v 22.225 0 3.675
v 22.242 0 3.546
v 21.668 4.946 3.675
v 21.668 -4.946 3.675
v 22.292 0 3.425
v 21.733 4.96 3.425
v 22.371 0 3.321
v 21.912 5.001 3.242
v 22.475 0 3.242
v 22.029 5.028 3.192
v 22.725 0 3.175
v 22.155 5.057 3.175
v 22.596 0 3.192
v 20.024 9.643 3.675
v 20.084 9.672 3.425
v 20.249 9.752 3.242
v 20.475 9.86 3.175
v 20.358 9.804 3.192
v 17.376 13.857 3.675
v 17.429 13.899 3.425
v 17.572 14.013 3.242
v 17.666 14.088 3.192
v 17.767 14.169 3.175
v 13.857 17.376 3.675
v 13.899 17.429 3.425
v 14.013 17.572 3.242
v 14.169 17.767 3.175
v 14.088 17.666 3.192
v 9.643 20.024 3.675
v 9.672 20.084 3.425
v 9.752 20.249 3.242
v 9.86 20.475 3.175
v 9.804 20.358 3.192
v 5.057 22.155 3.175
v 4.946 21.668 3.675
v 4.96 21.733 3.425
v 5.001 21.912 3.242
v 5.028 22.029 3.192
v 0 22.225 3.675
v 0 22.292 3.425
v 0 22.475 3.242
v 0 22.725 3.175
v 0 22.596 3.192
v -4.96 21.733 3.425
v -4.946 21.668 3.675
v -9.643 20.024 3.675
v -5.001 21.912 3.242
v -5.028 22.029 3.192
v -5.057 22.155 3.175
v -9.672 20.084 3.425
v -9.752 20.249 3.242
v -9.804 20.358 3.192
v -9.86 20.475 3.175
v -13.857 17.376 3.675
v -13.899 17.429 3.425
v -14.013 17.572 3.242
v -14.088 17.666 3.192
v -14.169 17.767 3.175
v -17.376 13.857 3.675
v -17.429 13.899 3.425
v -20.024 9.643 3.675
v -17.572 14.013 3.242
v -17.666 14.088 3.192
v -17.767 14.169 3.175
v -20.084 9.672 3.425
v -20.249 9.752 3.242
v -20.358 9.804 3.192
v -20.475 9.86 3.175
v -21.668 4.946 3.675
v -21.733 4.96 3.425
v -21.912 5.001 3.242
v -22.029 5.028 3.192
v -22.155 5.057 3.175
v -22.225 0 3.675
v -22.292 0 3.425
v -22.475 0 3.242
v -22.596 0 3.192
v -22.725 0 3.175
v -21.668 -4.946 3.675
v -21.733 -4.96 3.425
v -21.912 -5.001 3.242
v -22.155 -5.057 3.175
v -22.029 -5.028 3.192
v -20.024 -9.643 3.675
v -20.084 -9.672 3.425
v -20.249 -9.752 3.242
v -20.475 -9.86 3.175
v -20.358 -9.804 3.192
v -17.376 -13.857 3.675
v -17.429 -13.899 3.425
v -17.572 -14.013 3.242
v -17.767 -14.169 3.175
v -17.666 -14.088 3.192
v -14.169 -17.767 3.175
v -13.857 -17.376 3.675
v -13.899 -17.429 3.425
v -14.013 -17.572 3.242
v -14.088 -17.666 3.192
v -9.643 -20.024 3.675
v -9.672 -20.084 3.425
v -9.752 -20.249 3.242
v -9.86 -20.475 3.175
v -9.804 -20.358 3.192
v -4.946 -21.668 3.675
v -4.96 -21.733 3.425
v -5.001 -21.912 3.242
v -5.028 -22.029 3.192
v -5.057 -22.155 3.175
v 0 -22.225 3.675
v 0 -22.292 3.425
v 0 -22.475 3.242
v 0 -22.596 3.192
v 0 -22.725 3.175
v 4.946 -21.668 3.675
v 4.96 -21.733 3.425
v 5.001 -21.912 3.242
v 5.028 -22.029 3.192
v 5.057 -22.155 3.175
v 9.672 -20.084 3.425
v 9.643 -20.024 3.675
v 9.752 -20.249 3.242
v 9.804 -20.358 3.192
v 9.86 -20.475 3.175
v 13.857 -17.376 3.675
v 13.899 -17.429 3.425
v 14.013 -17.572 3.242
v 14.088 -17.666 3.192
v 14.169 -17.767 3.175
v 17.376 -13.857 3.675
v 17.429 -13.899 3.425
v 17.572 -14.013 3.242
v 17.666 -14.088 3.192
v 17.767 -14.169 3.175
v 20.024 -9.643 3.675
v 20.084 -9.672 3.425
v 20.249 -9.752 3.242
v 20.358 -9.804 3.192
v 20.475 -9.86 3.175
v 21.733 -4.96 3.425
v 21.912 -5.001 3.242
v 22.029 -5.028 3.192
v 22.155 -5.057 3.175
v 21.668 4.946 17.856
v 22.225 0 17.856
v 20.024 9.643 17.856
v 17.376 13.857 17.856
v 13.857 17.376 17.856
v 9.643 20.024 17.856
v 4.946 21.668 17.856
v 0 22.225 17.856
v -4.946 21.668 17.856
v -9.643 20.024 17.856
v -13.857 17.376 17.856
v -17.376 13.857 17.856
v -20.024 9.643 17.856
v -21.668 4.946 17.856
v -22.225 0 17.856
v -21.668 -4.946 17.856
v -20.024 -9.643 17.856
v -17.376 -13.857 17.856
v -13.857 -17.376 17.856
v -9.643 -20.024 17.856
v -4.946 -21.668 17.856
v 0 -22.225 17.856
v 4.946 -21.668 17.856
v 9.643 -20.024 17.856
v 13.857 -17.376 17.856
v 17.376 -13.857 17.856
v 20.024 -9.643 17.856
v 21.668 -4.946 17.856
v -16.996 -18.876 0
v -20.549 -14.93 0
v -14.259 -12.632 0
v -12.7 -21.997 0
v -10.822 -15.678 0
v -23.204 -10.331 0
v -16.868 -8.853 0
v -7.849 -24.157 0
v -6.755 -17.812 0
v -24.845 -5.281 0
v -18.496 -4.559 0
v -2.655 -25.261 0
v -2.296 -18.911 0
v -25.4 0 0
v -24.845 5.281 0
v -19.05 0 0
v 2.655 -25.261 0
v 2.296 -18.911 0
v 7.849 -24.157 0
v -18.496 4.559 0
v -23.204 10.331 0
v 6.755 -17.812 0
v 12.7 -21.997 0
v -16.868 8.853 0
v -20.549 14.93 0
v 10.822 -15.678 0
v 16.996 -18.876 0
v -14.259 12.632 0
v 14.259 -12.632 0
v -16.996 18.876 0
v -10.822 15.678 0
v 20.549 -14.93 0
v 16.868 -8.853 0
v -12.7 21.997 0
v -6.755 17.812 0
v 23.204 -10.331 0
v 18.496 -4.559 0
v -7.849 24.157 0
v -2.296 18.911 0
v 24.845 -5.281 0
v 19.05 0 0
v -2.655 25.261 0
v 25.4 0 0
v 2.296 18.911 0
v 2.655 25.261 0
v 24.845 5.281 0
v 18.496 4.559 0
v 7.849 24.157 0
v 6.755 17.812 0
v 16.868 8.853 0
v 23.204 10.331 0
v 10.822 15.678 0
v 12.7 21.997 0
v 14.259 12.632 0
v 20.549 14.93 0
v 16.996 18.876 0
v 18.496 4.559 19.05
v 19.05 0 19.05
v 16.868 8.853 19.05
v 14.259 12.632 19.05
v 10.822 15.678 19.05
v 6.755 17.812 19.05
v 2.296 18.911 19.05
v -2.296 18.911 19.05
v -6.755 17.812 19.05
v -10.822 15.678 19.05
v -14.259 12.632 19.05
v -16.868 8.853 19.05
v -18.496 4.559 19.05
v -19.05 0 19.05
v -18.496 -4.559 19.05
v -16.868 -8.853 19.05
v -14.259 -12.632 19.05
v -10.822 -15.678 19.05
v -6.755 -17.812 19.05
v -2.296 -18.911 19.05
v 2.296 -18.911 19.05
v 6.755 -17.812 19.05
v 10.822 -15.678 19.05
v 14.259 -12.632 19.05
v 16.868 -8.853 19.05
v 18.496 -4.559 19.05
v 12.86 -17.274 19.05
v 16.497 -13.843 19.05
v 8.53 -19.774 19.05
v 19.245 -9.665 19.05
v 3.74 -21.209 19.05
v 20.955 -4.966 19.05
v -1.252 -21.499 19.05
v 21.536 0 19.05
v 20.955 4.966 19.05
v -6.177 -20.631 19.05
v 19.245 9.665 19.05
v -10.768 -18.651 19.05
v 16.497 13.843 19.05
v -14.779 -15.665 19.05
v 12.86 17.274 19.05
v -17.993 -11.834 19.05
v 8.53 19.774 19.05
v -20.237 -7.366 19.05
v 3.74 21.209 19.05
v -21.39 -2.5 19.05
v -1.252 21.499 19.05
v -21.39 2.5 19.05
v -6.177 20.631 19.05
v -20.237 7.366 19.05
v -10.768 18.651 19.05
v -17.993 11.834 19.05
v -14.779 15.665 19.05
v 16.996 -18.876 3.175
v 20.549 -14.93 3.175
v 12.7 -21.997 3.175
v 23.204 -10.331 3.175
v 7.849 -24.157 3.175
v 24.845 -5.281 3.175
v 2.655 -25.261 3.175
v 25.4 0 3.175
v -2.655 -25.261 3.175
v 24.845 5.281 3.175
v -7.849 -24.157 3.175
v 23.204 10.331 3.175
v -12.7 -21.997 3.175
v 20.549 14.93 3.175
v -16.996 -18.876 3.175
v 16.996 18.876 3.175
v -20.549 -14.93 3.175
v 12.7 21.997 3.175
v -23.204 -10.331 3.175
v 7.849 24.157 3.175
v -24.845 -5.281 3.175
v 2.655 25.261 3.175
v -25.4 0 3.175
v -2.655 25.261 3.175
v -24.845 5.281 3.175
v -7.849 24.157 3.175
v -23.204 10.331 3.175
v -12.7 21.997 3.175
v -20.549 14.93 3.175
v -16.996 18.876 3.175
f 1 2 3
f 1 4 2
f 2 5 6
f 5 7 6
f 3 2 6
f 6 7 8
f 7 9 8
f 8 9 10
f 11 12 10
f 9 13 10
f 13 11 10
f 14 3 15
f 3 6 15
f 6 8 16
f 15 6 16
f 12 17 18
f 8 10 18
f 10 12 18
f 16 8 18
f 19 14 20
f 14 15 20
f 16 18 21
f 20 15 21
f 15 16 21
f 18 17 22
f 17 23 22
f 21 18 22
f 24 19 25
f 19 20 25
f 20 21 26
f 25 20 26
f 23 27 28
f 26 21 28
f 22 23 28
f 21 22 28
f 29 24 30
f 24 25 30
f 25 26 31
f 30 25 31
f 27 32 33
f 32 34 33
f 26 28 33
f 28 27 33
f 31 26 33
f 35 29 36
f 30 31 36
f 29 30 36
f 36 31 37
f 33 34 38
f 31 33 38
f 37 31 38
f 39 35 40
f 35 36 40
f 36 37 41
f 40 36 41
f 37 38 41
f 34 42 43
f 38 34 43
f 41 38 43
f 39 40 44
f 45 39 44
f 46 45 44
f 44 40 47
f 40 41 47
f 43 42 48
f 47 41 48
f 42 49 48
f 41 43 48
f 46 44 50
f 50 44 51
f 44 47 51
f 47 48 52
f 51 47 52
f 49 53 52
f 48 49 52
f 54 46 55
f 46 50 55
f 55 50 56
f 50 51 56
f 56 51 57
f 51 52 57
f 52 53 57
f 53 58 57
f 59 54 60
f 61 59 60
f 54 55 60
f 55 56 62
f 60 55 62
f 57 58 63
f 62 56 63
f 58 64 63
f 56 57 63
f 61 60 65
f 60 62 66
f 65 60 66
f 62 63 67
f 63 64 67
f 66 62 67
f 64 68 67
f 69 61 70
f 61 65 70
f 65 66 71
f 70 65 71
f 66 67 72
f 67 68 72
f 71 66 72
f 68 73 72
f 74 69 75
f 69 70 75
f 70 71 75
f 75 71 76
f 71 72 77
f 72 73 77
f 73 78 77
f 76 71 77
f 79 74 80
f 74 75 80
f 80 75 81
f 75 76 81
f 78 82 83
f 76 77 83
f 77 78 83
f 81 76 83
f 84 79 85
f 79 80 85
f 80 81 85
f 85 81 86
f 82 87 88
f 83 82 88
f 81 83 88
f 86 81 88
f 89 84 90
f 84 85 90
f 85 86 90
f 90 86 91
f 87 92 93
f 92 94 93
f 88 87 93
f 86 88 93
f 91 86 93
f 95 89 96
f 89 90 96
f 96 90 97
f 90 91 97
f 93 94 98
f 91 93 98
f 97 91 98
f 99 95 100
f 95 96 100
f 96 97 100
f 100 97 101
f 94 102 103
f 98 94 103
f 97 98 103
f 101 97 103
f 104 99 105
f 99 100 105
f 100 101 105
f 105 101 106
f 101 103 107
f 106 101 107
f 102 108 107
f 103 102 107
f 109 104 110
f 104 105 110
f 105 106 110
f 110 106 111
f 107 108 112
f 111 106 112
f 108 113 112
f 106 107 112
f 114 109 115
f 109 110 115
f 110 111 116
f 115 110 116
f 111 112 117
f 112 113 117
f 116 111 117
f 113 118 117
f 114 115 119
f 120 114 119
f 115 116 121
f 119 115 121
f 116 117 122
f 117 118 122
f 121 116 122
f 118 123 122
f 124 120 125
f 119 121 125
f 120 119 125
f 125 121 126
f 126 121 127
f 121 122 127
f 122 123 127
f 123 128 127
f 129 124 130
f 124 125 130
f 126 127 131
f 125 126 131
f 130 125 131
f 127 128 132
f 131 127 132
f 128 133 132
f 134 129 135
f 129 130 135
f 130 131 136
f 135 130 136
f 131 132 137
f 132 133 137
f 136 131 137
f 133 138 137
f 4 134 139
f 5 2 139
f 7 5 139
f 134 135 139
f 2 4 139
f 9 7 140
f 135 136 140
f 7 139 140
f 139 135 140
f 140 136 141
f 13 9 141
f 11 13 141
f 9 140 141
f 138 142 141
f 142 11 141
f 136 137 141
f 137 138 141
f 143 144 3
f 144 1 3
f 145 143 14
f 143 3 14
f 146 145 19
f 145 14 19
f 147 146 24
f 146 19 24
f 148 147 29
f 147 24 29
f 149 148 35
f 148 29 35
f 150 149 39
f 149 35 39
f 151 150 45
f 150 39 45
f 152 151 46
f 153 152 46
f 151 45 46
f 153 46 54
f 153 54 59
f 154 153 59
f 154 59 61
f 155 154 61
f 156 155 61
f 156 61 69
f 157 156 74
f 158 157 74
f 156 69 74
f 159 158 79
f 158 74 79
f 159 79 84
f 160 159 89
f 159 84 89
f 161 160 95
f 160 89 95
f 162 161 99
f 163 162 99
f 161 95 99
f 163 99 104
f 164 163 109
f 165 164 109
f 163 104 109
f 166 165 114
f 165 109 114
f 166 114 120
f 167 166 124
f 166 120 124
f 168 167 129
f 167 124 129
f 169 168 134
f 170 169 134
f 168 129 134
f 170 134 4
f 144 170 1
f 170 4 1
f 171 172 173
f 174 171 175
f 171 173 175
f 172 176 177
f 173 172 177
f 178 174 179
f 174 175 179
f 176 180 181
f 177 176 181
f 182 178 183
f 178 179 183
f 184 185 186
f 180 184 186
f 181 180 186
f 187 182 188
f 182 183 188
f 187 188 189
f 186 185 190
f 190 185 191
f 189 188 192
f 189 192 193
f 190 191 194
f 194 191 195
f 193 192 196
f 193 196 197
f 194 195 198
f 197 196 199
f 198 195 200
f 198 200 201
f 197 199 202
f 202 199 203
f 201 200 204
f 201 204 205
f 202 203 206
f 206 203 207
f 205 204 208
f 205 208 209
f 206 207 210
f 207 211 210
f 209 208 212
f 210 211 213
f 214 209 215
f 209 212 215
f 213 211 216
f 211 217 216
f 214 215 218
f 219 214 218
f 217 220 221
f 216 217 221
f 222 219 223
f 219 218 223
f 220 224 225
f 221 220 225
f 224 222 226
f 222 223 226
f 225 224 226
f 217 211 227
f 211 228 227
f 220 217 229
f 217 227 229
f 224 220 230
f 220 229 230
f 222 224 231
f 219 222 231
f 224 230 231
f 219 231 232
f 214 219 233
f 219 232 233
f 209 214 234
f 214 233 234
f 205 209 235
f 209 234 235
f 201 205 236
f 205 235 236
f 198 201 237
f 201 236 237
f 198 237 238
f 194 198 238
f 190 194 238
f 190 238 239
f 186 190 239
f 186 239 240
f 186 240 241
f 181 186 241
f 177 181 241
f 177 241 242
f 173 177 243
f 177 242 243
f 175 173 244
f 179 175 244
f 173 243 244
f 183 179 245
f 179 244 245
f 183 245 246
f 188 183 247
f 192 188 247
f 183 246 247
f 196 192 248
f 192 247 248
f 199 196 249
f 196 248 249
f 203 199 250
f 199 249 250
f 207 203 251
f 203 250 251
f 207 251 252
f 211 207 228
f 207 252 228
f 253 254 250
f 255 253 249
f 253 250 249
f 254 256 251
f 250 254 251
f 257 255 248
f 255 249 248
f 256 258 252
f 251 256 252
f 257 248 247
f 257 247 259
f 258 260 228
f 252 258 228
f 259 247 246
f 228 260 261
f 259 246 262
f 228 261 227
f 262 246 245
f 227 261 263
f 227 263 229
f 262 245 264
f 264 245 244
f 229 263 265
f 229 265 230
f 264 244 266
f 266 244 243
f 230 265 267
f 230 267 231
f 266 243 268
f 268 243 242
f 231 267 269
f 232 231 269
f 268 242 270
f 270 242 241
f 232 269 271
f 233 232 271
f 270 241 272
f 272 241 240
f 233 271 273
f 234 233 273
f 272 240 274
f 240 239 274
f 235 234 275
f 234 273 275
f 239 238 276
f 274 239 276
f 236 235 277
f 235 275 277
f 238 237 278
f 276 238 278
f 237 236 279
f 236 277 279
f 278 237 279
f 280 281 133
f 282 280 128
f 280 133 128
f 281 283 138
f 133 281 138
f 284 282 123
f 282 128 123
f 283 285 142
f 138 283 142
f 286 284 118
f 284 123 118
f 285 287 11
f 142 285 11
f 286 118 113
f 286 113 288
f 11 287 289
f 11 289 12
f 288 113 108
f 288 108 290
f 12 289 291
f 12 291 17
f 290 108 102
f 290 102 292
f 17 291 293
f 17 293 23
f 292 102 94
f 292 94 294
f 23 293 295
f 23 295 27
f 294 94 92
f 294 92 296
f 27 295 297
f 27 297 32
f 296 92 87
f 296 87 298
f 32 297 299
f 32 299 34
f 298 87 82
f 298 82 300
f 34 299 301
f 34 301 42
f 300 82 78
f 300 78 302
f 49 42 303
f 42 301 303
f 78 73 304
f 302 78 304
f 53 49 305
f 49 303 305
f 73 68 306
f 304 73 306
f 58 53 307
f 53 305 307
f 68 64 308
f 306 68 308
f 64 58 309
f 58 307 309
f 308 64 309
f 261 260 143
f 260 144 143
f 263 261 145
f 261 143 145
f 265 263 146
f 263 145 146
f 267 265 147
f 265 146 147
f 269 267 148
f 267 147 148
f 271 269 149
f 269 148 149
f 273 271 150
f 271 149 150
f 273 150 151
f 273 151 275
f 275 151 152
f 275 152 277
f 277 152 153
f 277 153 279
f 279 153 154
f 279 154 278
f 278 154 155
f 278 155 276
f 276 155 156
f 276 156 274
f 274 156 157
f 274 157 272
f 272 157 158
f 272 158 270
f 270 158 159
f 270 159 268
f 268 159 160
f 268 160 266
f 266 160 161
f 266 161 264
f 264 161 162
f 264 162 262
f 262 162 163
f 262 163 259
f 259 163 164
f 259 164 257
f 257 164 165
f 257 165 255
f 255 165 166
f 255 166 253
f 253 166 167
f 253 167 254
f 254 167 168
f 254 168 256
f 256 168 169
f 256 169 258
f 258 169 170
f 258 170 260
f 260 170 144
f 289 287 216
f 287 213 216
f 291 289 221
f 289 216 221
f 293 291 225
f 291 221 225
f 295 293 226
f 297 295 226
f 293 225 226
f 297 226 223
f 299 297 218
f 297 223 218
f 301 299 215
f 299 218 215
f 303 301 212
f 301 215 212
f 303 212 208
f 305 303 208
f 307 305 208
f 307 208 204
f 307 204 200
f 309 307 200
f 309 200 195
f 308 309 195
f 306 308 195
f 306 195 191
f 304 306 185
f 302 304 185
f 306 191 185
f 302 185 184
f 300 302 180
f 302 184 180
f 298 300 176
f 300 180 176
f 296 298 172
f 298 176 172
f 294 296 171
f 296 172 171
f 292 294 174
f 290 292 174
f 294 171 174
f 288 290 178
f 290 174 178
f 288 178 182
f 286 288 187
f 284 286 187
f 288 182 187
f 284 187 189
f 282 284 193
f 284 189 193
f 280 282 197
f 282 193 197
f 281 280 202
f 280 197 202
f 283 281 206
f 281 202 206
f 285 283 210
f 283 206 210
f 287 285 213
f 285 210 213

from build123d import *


with BuildPart() as part:
    # Sketch1 → Revolve1 (revolve)
    with BuildSketch(Plane(origin=(0, 0, 0), x_dir=(1, 0, 0), z_dir=(0, 1, 0))):
        with BuildLine():
            Line((25.4, 0), (19.05, 0))
            Line((19.05, 0), (19.05, -19.05))
            Line((19.05, -19.05), (21.535759249, -19.05))
            Line((21.535759249, -19.05), (22.225, -17.8562))
            Line((22.225, -17.8562), (22.225, -3.675))
            ThreePointArc((22.225, -3.675), (22.371446609, -3.321446609), (22.725, -3.175))
            Line((22.725, -3.175), (25.4, -3.175))
            Line((25.4, -3.175), (25.4, 0))
        make_face()
    revolve(axis=Axis((0, 0, 0), (0, 0, 1)))


solid = part.part
